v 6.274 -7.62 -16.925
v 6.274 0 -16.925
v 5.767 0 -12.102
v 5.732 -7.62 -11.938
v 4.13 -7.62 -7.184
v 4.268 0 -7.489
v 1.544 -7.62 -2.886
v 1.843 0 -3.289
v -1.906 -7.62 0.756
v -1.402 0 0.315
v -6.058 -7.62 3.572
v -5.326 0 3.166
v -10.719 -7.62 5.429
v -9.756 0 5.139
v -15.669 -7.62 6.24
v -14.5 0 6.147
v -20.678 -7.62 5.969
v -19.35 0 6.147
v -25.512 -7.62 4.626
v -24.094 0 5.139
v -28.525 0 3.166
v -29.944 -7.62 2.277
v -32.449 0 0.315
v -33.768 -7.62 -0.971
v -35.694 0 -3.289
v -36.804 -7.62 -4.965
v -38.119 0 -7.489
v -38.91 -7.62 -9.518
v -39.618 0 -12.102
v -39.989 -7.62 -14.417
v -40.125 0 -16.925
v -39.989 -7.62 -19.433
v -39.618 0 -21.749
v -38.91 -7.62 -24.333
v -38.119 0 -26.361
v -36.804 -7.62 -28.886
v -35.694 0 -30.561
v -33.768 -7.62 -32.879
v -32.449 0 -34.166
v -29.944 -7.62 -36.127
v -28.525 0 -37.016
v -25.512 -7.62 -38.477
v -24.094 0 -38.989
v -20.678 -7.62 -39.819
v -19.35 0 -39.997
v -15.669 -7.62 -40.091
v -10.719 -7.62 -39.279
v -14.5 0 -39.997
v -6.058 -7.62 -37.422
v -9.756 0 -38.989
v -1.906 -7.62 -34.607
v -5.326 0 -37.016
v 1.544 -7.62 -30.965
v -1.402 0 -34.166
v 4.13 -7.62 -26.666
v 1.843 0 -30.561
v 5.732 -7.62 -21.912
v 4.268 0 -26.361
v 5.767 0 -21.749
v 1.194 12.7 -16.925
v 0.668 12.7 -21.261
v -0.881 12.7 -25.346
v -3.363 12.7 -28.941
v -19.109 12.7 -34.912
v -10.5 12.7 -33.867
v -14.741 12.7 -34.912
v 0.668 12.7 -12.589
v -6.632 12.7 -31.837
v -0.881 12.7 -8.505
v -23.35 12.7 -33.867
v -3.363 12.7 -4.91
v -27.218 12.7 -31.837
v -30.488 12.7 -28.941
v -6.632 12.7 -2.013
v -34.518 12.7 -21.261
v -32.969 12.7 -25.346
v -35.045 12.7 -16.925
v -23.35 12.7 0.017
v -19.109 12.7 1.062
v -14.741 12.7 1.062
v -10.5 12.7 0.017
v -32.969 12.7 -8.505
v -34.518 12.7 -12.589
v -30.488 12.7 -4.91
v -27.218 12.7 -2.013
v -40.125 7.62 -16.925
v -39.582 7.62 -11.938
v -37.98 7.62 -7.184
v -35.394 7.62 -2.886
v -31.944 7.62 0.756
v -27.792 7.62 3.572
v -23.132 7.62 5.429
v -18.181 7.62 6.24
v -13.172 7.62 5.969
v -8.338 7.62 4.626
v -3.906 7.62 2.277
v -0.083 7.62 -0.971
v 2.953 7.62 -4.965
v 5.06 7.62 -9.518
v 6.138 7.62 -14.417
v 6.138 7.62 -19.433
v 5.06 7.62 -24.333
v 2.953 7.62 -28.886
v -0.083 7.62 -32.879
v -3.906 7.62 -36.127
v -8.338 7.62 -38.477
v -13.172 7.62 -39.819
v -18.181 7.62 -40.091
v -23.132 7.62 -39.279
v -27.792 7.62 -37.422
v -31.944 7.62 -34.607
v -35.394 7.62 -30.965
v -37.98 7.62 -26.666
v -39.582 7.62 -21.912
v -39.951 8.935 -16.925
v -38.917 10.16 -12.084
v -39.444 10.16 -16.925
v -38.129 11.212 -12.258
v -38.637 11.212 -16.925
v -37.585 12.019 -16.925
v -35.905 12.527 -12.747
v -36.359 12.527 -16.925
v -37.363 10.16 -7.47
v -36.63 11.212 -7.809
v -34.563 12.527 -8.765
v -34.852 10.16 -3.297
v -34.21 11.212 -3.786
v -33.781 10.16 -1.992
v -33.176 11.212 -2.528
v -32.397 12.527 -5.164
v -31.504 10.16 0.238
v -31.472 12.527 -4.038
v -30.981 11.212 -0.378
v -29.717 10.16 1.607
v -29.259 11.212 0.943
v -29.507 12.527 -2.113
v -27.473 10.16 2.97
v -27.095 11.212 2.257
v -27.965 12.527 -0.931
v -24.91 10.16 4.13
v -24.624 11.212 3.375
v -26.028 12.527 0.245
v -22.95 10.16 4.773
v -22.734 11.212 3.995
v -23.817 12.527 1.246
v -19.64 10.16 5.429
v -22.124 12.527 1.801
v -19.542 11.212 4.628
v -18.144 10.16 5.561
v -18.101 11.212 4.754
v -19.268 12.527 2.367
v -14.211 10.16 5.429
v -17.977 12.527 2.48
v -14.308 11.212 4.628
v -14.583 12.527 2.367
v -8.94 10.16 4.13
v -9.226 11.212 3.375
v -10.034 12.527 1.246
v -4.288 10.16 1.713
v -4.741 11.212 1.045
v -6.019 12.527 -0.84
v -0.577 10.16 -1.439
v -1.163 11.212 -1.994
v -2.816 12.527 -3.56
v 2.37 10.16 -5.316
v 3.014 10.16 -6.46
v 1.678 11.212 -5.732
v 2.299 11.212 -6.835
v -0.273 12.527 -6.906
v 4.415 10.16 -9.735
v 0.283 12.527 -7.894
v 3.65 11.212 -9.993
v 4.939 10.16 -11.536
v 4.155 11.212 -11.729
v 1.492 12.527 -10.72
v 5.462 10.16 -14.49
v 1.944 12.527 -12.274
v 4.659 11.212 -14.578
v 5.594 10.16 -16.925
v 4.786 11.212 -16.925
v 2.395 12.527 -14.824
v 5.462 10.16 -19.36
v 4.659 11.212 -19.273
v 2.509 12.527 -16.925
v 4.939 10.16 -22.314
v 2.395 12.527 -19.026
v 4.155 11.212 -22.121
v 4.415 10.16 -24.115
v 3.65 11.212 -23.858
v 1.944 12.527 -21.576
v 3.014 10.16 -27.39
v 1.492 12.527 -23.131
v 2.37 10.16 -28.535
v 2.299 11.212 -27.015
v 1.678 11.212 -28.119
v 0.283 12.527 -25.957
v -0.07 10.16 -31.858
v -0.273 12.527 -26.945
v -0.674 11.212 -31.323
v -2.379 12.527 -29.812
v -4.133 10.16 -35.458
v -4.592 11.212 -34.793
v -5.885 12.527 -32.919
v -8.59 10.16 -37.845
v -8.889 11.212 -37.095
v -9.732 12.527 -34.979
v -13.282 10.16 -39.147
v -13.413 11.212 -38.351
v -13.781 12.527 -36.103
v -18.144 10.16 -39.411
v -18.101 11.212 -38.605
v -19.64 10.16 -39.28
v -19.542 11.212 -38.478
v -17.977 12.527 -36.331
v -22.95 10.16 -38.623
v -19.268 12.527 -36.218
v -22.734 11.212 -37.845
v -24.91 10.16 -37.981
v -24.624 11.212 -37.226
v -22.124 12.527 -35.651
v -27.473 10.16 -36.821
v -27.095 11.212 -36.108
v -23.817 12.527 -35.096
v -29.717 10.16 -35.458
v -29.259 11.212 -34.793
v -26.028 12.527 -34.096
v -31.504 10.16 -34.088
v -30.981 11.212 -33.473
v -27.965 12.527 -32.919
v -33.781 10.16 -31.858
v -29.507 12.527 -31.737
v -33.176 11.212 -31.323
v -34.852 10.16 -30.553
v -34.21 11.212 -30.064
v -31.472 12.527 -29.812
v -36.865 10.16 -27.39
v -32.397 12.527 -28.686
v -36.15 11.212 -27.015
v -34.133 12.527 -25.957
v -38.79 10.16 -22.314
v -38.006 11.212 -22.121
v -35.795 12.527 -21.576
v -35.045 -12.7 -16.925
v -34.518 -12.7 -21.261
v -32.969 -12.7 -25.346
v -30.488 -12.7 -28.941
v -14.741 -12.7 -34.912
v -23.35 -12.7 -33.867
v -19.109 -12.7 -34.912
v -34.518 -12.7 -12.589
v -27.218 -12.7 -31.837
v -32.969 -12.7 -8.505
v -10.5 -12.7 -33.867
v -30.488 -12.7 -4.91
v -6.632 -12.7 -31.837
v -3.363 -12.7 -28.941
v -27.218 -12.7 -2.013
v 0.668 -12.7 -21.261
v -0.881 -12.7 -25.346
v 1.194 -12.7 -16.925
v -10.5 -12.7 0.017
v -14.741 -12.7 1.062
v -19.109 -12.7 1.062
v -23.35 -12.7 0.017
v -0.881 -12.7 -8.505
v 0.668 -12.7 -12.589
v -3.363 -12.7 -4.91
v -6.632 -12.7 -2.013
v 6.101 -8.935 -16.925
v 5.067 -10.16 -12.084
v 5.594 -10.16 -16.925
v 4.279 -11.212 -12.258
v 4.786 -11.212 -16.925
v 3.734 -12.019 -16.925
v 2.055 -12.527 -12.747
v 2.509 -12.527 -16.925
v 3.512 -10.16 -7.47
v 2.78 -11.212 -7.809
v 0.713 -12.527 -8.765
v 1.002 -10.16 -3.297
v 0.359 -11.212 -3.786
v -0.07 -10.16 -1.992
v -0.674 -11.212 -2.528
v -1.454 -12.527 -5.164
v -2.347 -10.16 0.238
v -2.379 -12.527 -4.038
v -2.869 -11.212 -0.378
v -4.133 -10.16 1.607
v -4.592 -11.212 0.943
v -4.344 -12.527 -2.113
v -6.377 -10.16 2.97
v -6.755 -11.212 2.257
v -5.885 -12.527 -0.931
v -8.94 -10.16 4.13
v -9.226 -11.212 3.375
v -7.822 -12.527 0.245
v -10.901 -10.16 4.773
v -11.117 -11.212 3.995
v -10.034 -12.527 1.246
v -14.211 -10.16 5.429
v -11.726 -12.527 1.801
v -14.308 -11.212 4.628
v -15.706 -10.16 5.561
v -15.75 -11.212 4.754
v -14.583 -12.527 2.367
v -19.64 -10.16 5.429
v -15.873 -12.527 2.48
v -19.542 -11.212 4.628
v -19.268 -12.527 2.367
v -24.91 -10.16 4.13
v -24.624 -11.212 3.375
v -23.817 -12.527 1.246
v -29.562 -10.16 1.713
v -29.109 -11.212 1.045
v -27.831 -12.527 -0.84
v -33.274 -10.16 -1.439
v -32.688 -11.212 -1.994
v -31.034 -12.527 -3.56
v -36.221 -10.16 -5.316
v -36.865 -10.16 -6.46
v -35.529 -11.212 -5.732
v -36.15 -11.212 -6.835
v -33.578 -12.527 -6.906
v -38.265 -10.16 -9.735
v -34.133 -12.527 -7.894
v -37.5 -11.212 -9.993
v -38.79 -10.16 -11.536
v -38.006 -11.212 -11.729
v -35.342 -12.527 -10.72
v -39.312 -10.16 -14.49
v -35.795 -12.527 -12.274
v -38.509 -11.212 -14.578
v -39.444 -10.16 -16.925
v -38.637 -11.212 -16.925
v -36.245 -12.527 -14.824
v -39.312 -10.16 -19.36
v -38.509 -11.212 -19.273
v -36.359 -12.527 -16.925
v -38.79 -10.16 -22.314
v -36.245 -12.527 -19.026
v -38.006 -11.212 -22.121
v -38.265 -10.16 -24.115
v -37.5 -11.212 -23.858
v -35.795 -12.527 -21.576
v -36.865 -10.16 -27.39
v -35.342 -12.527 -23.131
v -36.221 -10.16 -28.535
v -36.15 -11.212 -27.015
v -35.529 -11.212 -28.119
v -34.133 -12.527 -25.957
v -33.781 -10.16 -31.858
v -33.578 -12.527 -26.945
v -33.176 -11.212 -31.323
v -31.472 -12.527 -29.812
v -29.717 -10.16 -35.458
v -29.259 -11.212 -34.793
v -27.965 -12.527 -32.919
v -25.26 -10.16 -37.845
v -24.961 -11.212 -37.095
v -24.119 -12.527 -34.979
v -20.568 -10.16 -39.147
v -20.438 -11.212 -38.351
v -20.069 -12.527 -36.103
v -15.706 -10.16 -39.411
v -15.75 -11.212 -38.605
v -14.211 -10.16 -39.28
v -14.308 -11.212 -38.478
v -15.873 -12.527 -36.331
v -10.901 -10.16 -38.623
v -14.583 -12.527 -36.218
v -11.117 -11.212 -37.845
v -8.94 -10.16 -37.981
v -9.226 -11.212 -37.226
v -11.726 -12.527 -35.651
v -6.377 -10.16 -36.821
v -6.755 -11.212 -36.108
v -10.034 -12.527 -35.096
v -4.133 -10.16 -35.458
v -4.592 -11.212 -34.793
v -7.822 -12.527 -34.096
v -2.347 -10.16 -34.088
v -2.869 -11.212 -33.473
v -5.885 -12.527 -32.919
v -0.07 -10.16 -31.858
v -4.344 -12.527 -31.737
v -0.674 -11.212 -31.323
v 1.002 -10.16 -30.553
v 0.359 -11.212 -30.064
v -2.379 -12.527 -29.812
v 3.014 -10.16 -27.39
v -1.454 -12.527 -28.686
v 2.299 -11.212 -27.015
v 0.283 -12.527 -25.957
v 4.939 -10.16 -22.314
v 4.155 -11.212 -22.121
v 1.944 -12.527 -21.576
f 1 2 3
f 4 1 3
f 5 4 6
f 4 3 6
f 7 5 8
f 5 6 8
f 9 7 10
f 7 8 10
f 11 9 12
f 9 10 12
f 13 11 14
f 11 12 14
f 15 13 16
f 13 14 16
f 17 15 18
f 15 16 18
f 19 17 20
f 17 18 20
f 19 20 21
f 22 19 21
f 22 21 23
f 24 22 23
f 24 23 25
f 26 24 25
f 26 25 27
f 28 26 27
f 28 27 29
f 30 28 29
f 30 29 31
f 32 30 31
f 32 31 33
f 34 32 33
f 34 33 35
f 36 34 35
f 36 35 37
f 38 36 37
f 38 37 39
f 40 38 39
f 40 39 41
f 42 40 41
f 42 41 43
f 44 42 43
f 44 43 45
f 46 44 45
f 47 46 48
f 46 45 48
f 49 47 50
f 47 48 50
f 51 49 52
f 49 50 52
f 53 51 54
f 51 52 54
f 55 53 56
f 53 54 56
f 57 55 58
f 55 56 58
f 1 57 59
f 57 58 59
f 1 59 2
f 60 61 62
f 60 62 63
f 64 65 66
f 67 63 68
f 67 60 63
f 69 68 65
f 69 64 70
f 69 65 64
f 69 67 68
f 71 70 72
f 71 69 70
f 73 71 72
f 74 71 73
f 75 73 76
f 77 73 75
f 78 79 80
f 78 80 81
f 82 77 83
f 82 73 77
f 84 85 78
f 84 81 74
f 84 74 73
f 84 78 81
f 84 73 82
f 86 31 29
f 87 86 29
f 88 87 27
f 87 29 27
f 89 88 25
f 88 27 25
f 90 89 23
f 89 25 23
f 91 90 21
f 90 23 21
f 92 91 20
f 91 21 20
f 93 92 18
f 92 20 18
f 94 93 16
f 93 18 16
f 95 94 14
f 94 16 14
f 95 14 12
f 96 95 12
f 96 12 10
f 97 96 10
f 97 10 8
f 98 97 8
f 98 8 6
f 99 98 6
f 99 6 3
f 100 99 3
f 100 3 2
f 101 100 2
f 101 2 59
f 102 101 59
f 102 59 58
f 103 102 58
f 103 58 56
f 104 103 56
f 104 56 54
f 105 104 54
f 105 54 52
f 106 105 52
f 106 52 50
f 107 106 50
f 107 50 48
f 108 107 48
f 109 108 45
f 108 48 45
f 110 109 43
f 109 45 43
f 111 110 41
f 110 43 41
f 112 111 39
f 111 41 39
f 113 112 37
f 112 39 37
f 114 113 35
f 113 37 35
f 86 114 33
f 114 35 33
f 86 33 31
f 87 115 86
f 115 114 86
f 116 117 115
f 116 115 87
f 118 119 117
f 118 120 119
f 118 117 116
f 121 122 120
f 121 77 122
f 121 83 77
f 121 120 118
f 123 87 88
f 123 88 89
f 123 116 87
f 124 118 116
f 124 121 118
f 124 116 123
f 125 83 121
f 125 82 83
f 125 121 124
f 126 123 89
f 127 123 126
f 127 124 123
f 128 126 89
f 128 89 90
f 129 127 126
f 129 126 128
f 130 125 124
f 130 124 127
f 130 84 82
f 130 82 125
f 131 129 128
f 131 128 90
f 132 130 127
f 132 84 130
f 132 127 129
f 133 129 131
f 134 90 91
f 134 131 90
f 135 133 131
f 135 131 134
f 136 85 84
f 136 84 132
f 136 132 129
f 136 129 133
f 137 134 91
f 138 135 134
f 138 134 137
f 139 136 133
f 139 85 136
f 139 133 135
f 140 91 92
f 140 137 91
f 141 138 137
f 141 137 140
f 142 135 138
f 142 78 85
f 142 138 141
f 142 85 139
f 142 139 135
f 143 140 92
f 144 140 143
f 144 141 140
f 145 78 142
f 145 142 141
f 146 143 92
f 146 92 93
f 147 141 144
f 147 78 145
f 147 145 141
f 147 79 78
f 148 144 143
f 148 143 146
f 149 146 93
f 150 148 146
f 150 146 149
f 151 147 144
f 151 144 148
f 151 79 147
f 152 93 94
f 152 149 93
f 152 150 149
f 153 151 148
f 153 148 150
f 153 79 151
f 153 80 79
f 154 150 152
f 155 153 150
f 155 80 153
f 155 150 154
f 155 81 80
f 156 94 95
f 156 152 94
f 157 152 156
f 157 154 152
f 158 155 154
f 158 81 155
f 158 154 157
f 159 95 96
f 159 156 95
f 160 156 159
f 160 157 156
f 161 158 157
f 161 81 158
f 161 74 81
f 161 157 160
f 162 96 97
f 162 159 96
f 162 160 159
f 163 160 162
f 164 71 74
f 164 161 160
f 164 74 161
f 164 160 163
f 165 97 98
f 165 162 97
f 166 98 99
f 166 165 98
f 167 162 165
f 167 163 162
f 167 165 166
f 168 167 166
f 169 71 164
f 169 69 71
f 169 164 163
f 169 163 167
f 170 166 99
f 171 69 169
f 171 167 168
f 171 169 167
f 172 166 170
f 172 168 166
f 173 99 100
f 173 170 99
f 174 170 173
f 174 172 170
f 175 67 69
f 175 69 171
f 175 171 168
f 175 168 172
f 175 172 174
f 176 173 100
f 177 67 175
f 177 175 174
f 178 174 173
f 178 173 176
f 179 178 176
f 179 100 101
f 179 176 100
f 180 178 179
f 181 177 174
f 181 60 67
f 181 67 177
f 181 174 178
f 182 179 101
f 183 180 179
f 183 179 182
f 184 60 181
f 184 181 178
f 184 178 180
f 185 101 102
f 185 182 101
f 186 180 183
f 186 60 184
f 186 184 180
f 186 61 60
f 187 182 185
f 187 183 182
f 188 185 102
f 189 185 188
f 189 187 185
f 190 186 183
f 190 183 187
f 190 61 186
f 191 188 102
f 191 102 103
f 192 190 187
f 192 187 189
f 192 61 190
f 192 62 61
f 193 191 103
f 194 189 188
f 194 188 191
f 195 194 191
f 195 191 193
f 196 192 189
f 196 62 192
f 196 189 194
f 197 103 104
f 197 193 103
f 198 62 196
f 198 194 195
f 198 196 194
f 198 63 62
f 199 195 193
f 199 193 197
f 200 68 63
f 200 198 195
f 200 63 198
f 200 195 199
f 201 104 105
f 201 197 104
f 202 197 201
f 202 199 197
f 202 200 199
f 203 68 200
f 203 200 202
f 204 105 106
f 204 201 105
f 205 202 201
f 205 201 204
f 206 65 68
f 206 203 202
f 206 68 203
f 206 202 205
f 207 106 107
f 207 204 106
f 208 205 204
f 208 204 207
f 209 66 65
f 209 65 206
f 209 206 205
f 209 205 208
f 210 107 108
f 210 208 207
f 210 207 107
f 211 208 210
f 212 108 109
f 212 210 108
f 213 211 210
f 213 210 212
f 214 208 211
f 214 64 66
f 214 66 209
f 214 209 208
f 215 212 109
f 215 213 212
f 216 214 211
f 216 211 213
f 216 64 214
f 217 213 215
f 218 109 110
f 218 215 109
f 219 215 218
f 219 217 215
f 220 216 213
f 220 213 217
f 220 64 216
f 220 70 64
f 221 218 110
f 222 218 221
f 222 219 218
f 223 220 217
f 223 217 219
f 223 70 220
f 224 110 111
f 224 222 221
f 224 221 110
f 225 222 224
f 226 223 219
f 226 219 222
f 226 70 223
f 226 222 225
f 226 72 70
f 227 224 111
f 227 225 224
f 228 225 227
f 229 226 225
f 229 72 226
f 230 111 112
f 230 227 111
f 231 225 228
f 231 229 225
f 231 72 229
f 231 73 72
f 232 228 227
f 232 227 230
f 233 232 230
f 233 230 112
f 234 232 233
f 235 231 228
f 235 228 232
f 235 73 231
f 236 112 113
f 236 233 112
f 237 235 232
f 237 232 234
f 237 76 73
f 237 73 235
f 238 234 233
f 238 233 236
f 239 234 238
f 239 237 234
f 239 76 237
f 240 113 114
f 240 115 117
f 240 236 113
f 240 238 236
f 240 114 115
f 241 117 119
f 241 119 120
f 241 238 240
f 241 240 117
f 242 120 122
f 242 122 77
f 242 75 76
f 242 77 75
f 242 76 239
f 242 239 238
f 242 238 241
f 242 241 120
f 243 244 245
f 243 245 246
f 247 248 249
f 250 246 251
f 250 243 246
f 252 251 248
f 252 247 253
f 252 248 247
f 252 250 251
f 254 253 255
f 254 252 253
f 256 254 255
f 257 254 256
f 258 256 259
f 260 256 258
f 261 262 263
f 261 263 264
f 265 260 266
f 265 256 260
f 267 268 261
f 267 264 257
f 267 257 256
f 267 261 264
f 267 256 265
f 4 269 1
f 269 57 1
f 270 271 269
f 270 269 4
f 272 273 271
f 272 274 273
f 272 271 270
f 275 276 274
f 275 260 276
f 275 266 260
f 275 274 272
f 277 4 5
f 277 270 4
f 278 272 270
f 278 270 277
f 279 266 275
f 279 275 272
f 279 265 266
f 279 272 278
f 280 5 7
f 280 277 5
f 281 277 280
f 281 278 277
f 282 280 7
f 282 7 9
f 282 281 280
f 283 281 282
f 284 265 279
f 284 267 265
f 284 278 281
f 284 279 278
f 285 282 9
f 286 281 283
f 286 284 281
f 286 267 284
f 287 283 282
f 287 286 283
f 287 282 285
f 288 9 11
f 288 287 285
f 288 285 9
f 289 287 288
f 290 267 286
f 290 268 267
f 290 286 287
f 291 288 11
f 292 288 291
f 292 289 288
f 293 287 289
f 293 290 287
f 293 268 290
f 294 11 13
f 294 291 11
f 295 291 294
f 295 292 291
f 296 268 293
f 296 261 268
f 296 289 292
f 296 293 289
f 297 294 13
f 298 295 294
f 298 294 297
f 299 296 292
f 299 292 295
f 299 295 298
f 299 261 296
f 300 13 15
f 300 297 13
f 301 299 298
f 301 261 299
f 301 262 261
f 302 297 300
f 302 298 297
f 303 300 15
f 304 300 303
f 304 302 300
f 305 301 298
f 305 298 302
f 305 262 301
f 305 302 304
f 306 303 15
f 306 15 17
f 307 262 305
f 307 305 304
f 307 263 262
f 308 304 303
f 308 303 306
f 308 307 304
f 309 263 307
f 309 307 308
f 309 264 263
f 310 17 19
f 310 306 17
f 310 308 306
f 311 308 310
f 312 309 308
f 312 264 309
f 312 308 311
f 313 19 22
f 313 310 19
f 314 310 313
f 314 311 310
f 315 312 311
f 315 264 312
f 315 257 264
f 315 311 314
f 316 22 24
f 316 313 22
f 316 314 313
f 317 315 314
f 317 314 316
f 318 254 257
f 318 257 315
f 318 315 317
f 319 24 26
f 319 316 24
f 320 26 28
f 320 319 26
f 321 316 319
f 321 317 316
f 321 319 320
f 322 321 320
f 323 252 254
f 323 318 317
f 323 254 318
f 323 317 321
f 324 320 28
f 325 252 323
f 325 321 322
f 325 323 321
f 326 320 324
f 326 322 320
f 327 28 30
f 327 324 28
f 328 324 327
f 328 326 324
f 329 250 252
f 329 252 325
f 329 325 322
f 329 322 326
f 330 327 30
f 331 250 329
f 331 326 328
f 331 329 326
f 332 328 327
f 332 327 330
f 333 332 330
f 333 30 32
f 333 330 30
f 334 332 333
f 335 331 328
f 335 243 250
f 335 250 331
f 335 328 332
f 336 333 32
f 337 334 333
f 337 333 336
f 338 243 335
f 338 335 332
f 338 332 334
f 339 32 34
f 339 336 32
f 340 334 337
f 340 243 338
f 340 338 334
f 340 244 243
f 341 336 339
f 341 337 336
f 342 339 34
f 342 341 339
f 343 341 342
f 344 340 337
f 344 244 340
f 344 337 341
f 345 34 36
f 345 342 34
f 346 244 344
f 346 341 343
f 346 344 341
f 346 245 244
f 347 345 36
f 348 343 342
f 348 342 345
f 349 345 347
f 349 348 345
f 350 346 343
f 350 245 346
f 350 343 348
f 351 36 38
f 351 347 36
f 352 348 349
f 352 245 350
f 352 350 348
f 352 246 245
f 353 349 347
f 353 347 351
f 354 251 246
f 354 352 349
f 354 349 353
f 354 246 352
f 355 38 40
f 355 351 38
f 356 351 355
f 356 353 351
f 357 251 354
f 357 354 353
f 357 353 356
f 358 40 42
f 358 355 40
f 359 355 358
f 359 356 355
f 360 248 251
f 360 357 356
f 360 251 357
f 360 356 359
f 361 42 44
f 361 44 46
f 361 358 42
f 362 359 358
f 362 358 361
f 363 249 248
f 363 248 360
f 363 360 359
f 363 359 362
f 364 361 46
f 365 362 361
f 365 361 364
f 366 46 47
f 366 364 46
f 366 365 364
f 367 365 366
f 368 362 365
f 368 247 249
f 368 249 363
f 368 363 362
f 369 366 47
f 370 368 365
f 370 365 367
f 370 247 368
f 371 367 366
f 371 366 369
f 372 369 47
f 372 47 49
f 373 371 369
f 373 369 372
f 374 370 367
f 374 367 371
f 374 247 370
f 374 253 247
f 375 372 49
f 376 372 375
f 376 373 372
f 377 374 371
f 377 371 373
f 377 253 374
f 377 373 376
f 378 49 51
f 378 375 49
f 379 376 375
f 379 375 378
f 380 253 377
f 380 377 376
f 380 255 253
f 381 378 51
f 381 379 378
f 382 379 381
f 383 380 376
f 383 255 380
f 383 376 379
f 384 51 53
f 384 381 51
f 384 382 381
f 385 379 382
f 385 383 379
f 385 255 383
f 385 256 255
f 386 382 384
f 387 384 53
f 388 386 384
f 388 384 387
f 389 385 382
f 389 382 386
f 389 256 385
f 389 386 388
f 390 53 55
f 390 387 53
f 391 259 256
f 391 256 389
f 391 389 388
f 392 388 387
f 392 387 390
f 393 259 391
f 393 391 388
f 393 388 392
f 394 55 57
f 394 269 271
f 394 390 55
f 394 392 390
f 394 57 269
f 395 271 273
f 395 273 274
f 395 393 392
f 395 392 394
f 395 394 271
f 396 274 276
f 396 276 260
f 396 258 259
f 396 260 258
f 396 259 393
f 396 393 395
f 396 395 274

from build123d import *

# Parameters (mm, degrees)
F0_R     = 23.199373
F1_DEPTH = 12.7
F2_R     = 23.199373
F3_DEPTH = 12.7
F4_R     = 5.08


with BuildPart() as f1:
    # F0 (on Front) → F1 (new body)
    with BuildSketch(Plane.XZ):
        with Locations((-16.925193, -16.925193)):
            Circle(F0_R)
    extrude(amount=F1_DEPTH)

    # F2 (on face) → F3 (join)
    with BuildSketch(Plane(origin=(0, 0, 0), x_dir=(-1, 0, 0), z_dir=(0, 1, 0))):
        with Locations((16.925193, -16.925193)):
            Circle(F2_R)
    extrude(amount=F3_DEPTH)

    # F4
    f4_edges = [f1.edges().sort_by_distance(p)[0] for p in [
        (6.274179, 12.7, -16.925193),
        (-16.925193, 0, 6.274179),
        (-16.925193, 0, -40.124566),
        (6.274179, -6.35, -16.925193),
        (-40.124566, -12.7, -16.925193),
        (-40.124566, 6.35, -16.925193),
    ]]
    fillet(f4_edges, radius=F4_R)


solid = f1.part
